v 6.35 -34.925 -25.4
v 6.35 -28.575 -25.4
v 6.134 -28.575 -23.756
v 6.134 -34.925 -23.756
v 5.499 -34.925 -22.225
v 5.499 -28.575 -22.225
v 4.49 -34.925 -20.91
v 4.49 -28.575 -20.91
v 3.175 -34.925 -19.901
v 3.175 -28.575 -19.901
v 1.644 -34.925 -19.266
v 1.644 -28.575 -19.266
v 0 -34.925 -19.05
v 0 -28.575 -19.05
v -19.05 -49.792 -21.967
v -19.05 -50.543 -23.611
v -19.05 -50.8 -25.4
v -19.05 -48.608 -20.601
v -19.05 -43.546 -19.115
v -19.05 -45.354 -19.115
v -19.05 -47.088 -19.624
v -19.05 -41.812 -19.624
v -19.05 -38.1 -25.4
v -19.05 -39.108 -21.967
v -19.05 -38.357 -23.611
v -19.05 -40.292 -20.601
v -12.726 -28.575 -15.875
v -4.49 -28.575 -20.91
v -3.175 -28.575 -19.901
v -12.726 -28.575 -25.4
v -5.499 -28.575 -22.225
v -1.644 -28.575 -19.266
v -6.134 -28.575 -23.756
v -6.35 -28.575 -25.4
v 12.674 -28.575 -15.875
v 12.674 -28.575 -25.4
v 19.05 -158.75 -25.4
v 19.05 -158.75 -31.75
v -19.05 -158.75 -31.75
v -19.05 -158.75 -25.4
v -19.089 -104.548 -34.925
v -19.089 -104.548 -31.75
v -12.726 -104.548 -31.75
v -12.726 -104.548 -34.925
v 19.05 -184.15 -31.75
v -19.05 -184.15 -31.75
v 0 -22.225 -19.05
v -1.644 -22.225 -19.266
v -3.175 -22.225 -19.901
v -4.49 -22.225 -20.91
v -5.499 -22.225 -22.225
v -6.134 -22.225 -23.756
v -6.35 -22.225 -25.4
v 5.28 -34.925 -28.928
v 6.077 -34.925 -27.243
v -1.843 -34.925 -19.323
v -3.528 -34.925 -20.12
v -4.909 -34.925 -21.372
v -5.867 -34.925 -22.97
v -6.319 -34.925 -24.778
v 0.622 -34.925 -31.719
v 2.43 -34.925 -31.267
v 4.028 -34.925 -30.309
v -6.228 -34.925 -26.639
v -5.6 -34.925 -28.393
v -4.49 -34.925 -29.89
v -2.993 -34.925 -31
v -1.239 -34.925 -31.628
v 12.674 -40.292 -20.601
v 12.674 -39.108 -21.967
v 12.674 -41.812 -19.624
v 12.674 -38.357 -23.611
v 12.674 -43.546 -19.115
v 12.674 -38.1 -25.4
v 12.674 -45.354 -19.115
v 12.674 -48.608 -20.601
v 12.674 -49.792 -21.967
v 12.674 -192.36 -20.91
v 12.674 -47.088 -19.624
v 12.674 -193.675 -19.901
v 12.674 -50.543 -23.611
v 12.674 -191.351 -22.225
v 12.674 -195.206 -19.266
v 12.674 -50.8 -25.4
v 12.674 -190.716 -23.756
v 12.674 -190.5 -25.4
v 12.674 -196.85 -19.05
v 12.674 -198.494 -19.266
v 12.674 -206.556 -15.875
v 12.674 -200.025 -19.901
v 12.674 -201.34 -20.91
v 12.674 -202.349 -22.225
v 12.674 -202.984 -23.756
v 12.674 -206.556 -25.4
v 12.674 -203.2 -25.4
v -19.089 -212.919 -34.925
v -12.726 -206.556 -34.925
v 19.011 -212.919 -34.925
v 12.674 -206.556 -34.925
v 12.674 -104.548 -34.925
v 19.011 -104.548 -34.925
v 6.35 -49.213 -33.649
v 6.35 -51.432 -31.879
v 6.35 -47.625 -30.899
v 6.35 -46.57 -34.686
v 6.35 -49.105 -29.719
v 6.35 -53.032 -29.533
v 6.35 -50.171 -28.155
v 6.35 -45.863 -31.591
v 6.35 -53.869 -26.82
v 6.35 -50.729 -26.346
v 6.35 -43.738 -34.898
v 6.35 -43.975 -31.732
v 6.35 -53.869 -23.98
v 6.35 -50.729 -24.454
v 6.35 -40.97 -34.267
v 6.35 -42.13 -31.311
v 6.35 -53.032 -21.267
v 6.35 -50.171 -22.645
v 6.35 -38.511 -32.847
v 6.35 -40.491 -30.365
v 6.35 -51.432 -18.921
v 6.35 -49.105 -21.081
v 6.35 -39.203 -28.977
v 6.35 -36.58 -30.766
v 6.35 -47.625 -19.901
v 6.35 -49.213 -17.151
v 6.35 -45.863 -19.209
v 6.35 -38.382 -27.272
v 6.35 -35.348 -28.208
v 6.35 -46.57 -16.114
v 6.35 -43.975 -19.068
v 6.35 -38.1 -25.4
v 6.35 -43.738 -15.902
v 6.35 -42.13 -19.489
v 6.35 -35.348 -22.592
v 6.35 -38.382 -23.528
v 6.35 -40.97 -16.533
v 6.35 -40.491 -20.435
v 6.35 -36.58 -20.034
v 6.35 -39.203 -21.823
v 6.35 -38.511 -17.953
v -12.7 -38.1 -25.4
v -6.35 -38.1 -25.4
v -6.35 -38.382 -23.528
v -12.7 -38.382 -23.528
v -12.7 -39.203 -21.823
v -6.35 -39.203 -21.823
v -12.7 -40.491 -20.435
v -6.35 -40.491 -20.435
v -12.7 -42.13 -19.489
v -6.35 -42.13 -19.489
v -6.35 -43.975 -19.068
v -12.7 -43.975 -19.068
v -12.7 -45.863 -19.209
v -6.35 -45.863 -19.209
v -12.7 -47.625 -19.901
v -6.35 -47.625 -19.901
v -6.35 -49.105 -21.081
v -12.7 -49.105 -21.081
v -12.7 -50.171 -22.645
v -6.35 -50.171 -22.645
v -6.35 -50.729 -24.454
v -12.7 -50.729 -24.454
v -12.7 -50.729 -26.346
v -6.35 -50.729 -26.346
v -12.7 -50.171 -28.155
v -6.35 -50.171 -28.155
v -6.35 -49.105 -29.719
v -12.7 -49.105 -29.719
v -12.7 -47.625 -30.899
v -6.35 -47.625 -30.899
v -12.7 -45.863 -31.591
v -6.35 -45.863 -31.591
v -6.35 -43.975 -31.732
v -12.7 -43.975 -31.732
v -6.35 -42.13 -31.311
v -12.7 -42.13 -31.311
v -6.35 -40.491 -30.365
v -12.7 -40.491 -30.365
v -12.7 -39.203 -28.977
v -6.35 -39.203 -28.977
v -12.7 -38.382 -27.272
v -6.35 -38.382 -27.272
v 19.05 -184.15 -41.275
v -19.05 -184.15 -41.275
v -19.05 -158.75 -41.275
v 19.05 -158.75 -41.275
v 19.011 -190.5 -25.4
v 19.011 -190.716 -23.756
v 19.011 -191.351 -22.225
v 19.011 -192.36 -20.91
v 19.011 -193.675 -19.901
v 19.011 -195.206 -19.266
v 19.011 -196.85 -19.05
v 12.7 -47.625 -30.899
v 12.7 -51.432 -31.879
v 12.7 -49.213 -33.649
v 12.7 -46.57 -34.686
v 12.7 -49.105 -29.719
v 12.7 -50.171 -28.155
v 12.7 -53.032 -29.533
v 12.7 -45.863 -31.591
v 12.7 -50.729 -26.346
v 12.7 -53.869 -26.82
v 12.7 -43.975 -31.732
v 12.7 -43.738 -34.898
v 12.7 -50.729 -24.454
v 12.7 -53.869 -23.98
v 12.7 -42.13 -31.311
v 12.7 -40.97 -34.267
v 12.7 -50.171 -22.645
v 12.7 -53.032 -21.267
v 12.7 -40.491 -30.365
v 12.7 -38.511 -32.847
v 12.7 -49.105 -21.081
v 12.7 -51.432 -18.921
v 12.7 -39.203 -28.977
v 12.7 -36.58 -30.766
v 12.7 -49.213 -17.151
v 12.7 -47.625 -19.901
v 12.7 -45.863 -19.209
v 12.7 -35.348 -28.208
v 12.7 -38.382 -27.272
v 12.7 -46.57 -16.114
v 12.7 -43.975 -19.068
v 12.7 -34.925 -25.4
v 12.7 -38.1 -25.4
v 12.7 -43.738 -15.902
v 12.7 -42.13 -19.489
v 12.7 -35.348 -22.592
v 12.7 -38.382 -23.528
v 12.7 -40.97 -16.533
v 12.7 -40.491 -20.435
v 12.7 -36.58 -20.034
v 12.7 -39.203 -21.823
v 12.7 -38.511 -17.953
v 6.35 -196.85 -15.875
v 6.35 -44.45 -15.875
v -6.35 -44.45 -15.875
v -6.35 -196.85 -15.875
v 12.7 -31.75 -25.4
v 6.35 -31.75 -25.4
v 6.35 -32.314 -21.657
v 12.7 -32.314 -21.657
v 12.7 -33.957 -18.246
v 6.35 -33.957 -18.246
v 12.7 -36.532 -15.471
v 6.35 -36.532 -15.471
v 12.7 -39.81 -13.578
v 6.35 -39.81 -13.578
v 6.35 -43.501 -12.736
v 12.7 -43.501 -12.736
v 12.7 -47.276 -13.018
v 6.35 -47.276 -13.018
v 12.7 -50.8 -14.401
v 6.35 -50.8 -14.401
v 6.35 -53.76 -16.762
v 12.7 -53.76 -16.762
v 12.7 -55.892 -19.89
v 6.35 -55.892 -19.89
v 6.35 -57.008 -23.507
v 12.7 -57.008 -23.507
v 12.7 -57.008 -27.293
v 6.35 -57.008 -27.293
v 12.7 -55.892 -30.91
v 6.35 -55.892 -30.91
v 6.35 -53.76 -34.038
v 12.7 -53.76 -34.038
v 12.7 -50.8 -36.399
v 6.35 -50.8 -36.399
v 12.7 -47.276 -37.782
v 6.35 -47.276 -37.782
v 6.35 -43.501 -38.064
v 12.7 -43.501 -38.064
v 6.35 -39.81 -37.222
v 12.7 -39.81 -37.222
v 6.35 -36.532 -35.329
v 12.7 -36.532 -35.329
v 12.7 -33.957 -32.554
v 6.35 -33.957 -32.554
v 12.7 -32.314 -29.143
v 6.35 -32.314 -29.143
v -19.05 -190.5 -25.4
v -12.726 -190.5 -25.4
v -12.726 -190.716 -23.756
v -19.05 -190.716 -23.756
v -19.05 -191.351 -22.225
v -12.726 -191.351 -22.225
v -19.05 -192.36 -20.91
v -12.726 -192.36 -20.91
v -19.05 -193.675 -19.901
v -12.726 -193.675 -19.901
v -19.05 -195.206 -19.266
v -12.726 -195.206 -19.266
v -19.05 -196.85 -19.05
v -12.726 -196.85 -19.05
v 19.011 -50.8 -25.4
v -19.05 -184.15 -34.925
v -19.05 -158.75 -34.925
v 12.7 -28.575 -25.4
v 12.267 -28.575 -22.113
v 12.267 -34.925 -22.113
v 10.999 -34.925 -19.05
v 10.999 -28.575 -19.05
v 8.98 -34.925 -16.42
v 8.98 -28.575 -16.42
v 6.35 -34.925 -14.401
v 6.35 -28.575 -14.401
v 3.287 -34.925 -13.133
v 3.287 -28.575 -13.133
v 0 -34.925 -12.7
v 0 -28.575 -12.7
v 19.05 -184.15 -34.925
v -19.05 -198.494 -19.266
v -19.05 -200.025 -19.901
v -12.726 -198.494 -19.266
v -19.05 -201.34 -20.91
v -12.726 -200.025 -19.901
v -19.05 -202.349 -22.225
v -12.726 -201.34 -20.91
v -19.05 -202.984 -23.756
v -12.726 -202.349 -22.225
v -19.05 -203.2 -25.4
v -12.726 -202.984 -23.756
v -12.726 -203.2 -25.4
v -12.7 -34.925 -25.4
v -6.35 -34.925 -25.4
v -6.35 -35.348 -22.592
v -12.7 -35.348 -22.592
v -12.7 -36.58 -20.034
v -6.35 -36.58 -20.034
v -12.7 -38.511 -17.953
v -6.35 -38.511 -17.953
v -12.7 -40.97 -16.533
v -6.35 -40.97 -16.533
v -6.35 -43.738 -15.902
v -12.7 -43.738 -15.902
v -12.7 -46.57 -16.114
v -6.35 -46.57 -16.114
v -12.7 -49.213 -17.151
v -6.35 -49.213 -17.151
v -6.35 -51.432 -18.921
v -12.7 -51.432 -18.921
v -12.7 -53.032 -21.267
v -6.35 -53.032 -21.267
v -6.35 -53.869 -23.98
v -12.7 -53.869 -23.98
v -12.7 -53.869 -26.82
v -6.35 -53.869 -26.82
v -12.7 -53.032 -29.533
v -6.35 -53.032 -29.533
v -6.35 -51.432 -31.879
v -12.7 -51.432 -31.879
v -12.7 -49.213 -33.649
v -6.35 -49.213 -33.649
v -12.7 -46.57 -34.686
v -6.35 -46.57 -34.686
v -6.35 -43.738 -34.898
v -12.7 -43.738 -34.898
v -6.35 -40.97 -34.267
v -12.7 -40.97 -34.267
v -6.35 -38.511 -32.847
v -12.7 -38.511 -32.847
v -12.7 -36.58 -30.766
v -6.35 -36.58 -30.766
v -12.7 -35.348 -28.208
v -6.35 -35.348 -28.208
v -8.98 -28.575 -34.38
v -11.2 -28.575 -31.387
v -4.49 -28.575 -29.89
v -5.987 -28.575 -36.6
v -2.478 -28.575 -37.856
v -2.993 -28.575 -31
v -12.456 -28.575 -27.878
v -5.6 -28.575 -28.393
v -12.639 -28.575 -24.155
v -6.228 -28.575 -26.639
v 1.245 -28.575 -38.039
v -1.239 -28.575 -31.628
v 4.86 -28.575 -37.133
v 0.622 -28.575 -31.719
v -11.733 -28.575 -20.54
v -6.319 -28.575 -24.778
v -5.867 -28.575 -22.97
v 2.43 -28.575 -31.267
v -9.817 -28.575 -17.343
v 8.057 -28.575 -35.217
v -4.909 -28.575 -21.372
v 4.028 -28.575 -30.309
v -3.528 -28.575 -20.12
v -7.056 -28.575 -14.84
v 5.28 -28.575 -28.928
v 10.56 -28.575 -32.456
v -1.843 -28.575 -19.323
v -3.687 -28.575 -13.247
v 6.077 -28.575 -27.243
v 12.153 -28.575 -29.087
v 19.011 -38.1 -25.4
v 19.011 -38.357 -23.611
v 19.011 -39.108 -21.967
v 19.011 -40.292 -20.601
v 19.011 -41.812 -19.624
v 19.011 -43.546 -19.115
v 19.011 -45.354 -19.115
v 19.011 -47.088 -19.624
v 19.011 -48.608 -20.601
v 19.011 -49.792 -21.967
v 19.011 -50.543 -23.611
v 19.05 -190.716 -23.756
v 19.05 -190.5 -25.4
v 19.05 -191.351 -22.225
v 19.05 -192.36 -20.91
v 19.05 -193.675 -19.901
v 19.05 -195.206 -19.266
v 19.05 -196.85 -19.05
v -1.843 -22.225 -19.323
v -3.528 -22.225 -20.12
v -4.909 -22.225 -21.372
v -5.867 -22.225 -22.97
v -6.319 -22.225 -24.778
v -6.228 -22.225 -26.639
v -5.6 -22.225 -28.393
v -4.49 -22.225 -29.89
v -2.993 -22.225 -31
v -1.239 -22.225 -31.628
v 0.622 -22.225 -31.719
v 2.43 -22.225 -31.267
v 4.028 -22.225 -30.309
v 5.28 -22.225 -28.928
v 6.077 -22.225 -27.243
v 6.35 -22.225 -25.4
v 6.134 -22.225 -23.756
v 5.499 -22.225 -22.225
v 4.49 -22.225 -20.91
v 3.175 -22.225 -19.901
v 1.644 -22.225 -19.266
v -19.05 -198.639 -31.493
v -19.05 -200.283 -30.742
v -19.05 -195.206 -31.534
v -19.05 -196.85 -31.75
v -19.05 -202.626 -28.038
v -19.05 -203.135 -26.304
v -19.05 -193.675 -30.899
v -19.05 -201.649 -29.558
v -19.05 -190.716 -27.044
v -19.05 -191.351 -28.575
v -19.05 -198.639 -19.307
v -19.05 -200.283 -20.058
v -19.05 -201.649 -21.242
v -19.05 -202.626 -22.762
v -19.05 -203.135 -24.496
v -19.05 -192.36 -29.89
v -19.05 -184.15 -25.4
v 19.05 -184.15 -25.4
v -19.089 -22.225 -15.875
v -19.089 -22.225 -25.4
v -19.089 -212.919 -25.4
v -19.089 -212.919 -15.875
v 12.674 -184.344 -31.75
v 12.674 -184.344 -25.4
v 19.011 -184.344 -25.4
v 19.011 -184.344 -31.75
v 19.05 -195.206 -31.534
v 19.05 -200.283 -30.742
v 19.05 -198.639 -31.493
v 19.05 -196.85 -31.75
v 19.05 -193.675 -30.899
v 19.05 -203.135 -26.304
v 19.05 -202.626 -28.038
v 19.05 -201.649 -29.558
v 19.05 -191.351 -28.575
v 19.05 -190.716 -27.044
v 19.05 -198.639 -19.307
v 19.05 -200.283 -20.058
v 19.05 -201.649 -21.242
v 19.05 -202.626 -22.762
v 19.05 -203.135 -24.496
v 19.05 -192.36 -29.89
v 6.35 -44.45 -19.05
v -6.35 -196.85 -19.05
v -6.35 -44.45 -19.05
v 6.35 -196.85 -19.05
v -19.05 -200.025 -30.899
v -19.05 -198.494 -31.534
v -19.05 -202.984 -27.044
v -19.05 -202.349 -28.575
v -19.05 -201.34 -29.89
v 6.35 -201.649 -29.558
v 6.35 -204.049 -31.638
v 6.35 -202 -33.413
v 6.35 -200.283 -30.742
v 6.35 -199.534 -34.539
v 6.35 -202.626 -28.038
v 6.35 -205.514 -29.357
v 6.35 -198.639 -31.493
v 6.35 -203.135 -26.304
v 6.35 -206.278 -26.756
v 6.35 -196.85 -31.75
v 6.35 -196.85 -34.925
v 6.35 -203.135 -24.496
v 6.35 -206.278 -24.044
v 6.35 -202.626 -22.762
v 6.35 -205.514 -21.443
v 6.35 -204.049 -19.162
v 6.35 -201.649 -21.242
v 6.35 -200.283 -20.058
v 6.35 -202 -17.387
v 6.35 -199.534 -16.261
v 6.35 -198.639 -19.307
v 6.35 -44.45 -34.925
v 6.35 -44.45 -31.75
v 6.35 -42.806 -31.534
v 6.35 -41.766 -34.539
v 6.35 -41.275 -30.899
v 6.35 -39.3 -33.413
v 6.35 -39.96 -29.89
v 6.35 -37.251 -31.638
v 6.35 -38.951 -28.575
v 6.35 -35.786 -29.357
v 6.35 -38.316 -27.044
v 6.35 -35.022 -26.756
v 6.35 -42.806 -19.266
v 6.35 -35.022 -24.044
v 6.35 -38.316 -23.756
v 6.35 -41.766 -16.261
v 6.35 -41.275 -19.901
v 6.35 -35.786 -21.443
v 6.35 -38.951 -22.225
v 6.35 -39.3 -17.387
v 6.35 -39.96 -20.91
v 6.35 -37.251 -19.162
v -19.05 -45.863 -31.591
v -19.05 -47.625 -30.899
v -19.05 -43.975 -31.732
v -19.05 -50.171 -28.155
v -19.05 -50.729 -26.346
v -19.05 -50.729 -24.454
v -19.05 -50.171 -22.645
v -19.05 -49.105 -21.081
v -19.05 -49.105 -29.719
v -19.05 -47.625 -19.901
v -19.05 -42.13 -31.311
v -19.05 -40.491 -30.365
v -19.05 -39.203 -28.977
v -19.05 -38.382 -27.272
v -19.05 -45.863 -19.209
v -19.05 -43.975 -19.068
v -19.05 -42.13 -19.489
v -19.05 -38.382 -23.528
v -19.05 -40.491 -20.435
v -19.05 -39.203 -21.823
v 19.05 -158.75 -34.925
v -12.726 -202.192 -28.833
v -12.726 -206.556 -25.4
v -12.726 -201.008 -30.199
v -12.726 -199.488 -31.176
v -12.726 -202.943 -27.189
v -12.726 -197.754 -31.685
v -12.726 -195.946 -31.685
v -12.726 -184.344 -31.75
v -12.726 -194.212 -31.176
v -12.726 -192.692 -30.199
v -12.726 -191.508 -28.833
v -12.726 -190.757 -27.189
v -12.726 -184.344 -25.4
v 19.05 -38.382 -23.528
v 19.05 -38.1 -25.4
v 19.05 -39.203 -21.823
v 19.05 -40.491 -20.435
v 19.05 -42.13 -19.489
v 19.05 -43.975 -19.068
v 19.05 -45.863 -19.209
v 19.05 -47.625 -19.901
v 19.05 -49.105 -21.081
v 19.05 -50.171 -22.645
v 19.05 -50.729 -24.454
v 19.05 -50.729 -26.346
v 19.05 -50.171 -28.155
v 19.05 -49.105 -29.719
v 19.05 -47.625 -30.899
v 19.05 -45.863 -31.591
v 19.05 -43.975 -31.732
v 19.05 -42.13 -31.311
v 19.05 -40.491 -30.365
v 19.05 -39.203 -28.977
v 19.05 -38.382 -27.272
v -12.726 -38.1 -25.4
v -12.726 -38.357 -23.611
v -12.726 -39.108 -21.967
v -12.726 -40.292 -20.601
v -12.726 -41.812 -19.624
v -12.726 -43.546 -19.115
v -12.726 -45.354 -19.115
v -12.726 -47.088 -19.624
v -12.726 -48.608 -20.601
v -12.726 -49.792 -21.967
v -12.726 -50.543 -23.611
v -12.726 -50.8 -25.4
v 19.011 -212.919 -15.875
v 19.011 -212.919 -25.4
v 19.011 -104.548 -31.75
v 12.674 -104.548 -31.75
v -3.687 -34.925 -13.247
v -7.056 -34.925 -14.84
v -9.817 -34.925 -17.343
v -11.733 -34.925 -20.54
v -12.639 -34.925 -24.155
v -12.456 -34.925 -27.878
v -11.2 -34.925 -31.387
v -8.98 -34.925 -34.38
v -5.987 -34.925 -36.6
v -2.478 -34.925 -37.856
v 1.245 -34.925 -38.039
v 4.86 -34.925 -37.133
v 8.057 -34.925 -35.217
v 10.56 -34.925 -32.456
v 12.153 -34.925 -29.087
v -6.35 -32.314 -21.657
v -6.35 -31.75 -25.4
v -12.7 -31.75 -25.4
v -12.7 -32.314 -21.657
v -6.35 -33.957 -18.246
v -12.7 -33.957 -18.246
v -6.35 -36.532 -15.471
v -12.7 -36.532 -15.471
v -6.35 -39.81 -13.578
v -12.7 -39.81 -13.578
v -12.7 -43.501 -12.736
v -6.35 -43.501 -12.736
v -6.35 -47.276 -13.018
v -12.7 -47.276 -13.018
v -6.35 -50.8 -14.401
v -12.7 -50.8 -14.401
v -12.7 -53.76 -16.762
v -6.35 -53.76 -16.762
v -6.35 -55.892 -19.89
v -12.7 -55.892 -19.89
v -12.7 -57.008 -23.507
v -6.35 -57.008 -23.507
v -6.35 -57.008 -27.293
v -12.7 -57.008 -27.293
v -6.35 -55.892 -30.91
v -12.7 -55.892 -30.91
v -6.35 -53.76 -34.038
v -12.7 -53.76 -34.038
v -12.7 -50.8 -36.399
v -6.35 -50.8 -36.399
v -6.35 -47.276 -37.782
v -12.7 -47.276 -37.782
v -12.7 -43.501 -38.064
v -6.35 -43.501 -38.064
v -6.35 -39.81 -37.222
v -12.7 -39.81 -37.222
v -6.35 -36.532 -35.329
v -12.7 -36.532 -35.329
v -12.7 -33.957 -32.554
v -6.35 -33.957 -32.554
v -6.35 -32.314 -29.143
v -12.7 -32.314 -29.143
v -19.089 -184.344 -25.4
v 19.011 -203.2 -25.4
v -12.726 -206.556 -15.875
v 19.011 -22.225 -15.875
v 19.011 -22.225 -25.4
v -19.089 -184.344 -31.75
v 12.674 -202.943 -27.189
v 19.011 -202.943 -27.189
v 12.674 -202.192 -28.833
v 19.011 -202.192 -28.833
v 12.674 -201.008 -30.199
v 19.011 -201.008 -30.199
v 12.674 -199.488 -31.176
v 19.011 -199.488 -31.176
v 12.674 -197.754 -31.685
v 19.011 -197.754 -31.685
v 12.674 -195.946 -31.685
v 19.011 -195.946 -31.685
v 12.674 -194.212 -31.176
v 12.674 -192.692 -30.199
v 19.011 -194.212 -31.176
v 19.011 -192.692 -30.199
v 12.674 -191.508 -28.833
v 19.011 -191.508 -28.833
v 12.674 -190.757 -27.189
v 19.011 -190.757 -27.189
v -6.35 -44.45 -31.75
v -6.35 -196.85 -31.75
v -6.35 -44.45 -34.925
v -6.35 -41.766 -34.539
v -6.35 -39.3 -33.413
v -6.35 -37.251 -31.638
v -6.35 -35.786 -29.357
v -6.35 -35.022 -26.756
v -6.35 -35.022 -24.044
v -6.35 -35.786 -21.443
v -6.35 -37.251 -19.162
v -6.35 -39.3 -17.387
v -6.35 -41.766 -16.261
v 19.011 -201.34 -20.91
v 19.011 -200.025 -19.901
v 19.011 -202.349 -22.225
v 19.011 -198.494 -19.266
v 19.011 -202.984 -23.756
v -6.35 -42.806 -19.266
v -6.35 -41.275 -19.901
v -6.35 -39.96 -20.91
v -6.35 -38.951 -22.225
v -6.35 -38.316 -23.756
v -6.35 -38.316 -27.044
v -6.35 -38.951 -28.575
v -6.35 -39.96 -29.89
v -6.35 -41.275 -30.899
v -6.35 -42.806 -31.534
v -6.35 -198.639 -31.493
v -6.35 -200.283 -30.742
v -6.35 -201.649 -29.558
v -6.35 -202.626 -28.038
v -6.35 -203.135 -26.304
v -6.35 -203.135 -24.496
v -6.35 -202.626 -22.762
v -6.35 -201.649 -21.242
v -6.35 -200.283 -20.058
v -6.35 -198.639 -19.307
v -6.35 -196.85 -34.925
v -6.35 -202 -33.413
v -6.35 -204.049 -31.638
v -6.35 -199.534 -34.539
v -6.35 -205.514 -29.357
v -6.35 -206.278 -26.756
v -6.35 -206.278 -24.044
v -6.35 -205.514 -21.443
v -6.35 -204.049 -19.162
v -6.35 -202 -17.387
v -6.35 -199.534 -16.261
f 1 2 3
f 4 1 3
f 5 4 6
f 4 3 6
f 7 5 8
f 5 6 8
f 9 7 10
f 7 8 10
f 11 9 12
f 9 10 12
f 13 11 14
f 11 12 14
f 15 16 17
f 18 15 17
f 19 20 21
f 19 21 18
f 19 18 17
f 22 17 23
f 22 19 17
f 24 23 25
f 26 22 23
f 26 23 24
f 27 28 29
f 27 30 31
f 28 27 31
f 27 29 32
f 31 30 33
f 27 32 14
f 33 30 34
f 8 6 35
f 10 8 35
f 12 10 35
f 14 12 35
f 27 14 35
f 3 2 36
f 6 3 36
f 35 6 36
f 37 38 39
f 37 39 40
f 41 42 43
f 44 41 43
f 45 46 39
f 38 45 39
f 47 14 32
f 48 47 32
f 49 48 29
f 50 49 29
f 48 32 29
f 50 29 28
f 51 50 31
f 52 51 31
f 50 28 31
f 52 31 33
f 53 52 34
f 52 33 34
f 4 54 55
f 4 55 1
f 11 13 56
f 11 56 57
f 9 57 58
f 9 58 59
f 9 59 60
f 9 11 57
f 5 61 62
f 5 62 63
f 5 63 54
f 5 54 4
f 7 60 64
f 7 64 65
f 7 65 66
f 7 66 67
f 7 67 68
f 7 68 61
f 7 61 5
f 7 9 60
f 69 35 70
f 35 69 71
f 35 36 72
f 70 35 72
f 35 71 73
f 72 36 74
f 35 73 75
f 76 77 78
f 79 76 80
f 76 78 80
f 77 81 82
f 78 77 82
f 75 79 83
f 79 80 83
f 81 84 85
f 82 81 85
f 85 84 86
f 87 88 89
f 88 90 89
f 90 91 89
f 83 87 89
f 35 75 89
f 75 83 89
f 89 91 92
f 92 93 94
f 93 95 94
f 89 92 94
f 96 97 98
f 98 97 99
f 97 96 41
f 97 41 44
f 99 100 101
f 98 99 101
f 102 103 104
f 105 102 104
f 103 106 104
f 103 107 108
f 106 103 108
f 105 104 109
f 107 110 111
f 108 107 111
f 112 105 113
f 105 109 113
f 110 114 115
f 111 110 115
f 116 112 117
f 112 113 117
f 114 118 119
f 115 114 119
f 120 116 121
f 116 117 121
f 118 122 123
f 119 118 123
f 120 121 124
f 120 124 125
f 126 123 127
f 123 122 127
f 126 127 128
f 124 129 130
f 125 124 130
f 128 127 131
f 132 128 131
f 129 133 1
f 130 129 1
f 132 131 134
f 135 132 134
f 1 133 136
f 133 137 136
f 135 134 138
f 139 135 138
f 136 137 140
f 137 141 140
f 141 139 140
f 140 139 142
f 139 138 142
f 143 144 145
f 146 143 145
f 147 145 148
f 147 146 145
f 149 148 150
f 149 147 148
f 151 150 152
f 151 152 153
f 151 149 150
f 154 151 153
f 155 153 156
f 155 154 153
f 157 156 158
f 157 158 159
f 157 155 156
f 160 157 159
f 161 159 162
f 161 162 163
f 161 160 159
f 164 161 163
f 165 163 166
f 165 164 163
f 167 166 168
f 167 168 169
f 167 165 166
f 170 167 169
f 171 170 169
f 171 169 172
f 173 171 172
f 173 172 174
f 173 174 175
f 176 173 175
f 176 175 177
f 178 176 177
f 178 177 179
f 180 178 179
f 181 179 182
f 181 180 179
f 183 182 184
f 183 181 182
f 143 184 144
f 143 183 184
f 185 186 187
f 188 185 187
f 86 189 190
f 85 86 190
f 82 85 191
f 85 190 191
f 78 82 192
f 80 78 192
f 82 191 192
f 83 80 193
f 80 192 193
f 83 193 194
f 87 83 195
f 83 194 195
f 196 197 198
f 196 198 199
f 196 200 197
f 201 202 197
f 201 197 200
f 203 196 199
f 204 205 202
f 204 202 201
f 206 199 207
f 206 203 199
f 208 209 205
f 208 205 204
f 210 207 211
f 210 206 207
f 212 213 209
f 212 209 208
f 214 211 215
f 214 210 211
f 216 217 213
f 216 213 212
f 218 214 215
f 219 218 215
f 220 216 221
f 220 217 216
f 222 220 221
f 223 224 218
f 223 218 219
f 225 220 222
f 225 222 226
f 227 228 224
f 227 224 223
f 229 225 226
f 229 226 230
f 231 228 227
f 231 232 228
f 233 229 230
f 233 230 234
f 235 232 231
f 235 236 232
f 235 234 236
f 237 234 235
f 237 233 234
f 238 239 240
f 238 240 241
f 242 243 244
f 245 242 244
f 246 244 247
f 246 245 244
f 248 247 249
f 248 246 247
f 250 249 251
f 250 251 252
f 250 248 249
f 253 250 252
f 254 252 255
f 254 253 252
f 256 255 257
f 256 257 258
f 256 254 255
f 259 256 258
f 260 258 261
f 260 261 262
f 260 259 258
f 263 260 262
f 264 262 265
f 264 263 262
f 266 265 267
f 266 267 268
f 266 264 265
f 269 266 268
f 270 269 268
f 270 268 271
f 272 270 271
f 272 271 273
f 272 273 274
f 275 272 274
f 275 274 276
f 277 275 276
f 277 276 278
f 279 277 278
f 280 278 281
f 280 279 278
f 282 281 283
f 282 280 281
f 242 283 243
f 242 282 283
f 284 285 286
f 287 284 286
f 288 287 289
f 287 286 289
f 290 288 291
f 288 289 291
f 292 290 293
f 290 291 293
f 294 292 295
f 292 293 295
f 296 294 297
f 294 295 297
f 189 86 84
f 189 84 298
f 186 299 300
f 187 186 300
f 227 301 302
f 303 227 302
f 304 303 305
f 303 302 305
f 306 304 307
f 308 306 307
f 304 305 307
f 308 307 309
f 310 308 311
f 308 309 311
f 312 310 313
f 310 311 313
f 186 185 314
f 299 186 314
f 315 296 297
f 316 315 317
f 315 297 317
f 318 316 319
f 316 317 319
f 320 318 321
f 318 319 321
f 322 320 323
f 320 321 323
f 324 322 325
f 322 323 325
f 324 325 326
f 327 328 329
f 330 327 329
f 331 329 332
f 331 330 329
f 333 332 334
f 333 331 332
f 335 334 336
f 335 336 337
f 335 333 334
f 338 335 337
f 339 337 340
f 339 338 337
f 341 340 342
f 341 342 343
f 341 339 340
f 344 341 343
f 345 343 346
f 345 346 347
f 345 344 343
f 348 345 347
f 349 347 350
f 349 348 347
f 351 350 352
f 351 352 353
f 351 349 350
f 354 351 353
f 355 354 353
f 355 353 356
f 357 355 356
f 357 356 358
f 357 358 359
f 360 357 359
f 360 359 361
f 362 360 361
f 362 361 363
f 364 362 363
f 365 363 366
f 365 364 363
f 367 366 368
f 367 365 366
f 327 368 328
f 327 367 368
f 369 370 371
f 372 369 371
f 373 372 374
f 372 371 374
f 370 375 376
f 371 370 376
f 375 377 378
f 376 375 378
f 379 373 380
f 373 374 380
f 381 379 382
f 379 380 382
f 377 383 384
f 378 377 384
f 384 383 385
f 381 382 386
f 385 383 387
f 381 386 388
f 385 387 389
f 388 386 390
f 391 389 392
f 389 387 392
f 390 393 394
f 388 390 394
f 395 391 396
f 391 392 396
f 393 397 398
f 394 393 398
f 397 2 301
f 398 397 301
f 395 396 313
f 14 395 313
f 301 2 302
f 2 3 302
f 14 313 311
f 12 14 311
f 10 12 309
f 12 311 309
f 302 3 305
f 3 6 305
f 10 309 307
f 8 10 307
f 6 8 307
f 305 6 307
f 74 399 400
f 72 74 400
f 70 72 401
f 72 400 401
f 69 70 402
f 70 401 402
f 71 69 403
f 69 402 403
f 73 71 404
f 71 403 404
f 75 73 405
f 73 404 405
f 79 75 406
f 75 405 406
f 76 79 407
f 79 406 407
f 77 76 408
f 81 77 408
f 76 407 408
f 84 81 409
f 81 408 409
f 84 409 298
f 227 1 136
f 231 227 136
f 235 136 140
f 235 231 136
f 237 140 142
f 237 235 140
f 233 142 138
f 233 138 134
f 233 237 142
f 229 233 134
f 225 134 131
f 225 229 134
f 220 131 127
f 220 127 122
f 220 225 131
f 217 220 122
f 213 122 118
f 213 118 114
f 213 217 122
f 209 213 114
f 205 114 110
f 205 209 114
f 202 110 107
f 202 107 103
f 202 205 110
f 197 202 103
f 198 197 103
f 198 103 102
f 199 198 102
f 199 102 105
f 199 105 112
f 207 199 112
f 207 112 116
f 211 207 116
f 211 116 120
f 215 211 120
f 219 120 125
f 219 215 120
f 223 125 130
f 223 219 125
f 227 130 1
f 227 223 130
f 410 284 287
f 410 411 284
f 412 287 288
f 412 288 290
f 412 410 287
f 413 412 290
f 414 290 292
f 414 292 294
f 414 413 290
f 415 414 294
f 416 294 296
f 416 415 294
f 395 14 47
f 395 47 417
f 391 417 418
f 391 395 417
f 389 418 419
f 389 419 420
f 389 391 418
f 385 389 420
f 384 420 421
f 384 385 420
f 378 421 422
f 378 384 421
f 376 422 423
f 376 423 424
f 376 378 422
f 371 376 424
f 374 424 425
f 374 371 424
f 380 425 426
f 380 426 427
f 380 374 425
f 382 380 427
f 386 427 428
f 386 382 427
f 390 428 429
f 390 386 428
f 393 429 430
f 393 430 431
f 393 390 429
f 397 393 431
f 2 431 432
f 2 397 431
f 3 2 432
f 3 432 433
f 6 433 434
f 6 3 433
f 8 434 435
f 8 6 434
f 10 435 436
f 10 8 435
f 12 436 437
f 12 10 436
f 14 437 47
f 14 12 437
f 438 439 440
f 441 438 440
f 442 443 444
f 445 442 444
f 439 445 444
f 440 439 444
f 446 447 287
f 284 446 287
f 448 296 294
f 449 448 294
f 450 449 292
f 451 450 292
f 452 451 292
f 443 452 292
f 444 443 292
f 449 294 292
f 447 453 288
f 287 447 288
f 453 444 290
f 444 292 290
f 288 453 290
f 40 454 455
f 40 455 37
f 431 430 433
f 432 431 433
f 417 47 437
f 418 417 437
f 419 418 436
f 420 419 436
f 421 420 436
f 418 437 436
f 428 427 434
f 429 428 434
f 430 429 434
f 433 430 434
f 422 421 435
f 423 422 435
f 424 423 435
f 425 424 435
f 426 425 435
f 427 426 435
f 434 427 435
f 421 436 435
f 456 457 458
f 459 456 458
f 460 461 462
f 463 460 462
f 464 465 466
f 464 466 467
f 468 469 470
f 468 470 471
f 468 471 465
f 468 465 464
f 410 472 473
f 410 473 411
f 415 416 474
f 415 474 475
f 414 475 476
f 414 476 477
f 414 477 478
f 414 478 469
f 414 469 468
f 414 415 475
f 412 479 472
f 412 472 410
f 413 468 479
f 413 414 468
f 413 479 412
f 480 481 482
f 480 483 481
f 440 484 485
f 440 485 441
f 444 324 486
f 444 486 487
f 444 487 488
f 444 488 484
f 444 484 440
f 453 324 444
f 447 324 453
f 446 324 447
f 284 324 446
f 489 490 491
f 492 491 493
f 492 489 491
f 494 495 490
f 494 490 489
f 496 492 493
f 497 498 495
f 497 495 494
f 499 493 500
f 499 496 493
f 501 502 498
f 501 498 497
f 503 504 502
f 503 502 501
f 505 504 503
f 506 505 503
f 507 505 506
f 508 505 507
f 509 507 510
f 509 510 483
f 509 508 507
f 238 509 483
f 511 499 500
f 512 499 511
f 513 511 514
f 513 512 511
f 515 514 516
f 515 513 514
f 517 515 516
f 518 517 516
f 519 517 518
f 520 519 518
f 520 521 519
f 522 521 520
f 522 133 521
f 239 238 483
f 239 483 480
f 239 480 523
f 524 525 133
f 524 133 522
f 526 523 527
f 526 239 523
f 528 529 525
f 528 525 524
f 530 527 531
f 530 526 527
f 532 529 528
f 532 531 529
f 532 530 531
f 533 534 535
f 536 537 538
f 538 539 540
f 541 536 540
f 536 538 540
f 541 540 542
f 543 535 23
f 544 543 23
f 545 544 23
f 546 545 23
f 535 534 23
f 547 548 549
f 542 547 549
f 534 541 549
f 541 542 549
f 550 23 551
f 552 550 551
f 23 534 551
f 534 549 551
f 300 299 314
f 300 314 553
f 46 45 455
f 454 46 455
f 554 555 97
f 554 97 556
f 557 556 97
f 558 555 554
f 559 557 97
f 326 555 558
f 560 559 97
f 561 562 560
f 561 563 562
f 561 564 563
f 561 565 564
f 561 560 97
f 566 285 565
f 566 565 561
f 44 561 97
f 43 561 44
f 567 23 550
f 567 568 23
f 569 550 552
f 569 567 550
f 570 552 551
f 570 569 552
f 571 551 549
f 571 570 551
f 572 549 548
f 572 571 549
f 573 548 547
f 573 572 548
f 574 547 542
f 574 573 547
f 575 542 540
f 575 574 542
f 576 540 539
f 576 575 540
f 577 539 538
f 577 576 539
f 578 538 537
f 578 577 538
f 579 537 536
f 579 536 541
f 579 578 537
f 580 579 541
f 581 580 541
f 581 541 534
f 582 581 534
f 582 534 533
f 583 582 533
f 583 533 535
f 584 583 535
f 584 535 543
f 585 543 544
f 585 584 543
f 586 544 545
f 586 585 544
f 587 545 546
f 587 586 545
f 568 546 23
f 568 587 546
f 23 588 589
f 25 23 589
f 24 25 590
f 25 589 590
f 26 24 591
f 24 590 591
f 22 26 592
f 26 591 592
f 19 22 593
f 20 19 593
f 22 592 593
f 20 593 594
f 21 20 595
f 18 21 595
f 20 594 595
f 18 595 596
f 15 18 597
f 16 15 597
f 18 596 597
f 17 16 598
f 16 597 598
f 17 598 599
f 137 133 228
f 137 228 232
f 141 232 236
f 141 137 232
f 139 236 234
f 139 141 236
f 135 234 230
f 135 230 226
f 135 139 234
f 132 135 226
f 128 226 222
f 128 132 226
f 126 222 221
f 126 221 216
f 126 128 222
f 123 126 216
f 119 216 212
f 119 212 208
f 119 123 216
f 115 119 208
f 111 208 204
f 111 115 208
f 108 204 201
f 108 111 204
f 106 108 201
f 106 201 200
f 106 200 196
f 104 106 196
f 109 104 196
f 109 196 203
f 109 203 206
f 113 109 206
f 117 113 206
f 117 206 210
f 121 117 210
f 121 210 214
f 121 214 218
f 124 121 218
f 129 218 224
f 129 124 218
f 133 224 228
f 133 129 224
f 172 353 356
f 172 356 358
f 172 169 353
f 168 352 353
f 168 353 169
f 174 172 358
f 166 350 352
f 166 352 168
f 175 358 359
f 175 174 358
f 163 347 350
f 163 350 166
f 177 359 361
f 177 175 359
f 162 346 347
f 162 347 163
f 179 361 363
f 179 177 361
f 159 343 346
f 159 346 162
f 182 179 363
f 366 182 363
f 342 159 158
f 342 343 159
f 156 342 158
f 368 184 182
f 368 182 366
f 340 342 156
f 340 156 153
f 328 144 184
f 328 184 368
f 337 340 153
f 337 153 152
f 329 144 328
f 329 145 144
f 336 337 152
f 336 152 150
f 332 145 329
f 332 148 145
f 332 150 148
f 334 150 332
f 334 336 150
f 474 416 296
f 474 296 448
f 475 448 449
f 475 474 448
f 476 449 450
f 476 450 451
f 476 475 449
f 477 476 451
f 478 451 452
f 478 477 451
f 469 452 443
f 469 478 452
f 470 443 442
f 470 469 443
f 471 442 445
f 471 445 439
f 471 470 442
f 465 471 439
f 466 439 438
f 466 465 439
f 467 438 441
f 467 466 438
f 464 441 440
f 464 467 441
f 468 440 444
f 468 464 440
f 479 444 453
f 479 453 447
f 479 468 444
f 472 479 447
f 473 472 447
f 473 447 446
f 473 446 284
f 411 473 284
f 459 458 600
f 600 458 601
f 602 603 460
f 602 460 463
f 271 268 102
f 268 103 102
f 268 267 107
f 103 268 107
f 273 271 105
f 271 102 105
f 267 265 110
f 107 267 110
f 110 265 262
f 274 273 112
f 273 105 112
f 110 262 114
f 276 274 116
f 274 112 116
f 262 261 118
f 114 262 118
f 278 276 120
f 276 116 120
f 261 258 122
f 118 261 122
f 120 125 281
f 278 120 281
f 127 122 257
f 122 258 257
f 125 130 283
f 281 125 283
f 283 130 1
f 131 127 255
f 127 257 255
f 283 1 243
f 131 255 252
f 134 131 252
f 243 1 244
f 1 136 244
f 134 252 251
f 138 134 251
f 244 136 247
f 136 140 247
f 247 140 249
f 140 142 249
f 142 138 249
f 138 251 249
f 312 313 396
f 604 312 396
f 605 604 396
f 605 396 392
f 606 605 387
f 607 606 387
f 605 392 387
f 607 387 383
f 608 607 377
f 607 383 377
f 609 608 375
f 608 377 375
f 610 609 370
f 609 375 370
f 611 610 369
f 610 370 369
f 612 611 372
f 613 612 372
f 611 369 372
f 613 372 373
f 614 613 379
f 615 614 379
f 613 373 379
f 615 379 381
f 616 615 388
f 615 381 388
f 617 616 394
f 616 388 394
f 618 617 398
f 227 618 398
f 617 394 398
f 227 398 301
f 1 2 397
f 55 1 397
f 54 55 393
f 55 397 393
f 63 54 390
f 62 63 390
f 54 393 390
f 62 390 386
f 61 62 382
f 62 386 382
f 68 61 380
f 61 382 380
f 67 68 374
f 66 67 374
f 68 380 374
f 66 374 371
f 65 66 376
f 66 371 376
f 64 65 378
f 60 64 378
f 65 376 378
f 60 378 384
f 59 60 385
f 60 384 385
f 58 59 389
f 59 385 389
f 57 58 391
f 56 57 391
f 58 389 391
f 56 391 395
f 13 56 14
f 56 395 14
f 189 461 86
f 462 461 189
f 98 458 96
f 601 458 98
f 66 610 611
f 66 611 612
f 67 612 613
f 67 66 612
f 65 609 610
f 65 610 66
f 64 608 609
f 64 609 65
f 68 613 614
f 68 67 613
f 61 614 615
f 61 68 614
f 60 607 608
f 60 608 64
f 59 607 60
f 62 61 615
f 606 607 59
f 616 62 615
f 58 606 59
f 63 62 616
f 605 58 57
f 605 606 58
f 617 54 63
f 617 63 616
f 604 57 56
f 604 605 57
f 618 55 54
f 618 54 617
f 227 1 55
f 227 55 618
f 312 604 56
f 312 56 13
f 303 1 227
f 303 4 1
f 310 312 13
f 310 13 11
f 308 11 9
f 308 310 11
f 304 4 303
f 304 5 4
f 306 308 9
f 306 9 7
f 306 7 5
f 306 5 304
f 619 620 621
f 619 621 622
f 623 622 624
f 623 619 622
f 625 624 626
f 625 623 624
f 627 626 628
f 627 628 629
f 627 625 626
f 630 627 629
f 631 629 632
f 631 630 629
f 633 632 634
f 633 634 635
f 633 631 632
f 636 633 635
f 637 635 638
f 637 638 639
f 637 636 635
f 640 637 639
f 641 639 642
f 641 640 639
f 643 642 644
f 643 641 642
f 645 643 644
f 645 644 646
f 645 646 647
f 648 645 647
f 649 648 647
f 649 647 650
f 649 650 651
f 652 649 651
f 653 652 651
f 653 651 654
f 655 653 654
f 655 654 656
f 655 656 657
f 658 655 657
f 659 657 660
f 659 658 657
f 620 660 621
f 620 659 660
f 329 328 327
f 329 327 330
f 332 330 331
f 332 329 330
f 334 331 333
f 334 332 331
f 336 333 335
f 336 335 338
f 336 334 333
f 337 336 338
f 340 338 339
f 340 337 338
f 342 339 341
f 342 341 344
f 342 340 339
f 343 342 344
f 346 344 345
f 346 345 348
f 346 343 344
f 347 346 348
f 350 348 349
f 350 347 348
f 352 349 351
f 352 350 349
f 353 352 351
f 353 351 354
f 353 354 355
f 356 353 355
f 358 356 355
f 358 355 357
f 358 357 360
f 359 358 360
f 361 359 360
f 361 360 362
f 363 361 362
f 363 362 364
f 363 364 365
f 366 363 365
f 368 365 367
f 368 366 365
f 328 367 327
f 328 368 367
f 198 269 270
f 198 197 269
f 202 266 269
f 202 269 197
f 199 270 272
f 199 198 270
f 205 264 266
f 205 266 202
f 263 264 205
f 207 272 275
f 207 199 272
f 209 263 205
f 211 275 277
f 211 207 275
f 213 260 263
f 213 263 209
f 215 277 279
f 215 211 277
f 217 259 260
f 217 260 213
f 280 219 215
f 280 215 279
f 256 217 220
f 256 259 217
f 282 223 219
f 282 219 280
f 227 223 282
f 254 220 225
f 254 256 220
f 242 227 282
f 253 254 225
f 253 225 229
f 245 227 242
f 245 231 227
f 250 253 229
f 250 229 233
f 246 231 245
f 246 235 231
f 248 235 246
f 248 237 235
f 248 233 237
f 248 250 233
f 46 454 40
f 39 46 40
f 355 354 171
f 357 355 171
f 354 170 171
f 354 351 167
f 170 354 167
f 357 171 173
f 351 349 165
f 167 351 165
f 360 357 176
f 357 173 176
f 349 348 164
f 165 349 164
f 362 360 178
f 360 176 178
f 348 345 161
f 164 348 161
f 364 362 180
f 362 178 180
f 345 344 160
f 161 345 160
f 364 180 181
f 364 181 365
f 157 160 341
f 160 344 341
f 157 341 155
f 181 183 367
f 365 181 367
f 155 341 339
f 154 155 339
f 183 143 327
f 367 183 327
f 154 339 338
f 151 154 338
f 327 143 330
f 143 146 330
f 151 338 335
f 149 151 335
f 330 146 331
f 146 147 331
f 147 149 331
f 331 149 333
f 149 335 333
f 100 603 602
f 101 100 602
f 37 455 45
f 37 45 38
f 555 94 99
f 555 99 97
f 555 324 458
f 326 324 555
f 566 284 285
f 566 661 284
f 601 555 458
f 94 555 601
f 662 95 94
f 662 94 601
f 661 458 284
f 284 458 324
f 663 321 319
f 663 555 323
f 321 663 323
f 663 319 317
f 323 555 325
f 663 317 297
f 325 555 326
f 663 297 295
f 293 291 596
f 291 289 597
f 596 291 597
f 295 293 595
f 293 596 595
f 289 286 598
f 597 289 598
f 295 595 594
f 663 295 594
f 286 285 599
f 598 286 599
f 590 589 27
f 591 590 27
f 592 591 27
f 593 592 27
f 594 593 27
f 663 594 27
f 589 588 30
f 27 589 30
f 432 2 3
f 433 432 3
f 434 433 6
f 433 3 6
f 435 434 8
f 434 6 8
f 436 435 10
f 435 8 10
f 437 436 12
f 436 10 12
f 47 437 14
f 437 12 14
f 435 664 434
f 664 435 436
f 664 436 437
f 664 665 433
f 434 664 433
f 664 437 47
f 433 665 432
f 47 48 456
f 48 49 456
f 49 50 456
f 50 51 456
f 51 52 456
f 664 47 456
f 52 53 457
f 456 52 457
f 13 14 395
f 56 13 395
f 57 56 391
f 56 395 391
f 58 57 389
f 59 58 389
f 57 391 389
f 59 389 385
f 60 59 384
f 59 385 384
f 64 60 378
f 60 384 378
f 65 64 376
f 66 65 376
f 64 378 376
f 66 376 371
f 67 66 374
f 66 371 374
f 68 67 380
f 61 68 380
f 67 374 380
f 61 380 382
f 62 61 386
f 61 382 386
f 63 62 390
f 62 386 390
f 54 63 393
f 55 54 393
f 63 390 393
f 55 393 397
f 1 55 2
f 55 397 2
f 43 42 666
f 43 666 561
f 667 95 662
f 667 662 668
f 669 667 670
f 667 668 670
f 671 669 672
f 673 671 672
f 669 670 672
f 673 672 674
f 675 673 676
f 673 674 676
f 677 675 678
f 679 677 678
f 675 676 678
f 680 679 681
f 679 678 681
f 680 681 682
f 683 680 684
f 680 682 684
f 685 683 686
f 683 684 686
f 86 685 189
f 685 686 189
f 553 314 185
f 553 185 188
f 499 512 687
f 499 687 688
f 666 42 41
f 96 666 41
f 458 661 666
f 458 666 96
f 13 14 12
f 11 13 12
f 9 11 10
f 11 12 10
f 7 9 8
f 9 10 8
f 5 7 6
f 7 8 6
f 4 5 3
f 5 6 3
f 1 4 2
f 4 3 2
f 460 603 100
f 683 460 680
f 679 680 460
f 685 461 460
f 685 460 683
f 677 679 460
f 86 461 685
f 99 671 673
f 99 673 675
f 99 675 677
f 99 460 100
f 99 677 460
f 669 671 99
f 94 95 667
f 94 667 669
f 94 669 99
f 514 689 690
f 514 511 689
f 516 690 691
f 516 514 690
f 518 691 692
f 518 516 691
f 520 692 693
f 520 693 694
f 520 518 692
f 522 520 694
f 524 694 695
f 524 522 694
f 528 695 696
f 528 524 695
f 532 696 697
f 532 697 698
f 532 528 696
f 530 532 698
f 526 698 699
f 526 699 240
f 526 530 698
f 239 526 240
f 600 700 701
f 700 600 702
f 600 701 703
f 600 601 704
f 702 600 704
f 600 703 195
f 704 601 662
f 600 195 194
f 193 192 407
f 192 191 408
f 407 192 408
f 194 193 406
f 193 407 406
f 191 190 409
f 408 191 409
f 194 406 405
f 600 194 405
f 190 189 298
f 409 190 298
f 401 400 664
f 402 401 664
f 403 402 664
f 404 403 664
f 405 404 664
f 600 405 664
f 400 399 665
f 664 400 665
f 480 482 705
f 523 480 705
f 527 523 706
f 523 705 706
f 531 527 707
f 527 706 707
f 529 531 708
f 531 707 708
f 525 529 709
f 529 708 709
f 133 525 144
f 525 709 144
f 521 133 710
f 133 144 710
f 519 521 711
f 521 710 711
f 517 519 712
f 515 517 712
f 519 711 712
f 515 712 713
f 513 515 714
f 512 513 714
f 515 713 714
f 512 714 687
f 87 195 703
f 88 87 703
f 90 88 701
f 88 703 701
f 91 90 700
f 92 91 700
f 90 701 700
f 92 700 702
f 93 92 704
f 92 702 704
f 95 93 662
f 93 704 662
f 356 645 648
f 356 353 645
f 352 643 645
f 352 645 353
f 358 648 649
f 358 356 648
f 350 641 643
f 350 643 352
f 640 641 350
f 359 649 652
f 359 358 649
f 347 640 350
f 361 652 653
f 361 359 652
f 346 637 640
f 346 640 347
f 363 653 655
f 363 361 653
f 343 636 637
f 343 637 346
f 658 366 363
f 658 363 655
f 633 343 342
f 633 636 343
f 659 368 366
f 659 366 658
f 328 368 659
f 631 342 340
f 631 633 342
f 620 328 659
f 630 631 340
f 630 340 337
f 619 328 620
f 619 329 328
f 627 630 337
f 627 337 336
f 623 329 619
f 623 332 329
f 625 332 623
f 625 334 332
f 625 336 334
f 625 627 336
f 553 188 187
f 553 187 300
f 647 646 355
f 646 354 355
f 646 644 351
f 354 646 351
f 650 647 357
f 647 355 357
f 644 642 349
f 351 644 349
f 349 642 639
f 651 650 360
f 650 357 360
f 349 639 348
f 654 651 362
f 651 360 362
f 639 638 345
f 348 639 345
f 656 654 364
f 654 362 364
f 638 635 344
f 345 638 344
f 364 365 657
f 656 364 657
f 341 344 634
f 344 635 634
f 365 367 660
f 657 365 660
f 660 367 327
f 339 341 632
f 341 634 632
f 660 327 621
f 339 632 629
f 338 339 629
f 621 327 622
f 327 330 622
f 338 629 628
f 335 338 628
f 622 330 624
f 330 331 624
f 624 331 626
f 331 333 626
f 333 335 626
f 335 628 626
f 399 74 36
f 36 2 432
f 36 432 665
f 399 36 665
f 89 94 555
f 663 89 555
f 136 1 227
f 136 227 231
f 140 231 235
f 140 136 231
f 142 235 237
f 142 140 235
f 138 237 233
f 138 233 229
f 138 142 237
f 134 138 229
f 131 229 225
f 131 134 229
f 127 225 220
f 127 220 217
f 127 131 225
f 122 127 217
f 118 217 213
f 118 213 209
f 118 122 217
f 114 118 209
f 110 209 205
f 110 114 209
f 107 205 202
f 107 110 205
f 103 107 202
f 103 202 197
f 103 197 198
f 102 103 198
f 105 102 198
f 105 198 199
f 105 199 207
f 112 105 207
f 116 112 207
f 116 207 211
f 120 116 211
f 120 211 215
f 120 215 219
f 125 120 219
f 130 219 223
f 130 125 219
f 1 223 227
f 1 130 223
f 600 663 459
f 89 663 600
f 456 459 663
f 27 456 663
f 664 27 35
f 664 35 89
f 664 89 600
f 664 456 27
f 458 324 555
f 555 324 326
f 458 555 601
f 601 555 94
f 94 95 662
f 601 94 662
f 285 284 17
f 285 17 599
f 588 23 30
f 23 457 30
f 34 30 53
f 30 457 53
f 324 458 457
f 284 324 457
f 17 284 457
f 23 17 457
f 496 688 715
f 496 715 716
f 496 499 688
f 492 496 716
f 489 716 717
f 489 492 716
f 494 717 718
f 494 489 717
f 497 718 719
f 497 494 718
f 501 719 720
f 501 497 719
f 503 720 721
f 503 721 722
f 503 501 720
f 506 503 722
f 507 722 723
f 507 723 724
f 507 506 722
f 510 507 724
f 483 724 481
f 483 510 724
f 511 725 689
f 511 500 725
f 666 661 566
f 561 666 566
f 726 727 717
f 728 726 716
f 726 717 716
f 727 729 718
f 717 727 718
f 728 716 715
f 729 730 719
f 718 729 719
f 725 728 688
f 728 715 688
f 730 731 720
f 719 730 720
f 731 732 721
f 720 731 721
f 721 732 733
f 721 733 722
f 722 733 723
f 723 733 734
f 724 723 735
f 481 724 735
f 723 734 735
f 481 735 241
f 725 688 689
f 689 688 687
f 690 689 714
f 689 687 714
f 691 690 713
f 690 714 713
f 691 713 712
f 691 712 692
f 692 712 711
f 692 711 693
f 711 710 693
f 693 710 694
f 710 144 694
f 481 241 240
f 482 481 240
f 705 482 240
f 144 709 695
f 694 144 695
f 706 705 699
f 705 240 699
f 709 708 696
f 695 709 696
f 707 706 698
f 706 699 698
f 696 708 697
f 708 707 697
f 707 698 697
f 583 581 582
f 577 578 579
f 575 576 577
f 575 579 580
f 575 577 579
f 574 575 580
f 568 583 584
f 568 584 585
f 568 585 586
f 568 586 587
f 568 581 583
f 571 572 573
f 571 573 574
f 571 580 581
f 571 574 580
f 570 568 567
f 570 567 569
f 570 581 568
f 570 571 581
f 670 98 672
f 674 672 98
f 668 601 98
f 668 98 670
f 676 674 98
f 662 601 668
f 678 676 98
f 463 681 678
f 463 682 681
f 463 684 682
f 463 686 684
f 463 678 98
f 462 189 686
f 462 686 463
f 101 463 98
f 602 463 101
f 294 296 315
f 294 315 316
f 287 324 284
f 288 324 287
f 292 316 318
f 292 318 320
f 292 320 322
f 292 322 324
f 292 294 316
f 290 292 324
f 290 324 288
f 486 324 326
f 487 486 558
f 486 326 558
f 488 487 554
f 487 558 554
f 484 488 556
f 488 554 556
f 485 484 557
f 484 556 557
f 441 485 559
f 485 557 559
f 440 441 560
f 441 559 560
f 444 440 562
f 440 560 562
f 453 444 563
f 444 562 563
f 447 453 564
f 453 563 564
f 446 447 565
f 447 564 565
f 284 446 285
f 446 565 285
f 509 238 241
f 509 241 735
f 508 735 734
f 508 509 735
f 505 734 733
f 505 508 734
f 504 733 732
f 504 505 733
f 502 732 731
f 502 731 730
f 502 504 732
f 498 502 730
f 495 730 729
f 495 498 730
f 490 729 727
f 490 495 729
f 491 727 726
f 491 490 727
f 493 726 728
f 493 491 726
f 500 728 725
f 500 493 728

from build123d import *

# Parameters (mm, degrees)
F2_DEPTH  = 6.35
F3_R      = 12.7
F3_R_2    = 9.525
F4_DEPTH  = 12.7
F5_DEPTH  = 6.35
F3_R_3    = 6.35
F6_DEPTH  = 19.05
F7_DEPTH  = 12.7
F8_DEPTH  = 6.35
F10_DEPTH = 6.35
F11_DEPTH = 19.05
F9_W      = 25.4
F9_H      = 6.35
F12_DEPTH = 19.05
F13_DEPTH = 6.35
F15_W     = 6.3629296671
F15_H     = 79.796386
F15_W_2   = 6.3370703329
F16_DEPTH = 9.525
F17_DEPTH = 6.35
F18_DEPTH = 9.525


# Not quite as in the source:
# - a feature names something its author has since deleted; it is built from what else it names


with BuildPart() as f2:
    # F1 (on offset) → F2 (new body)
    with BuildSketch(Plane.XZ.offset(28.575)):
        with BuildLine():
            ThreePointArc((12.7, -25.4), (8.9802561211, -16.4197438789), (0, -12.7))
            ThreePointArc((0, -12.7), (-8.9802561211, -34.3802561211), (12.7, -25.4))
        make_face()
        with BuildLine():
            ThreePointArc((6.35, -25.4), (-4.4901280605, -29.8901280605), (0, -19.05))
            ThreePointArc((0, -19.05), (4.4901280605, -20.9098719395), (6.35, -25.4))
        make_face(mode=Mode.SUBTRACT)
    extrude(amount=F2_DEPTH)


with BuildPart() as f4:
    # F3 (on Right) → F4 (new body, symmetric)
    with BuildSketch(Plane.YZ):
        with Locations((-44.45, -25.4)):
            Circle(F3_R)
        with Locations((-44.45, -25.4)):
            Circle(F3_R_2, mode=Mode.SUBTRACT)
    extrude(amount=F4_DEPTH, both=True)

    # F3 (on Right) → F5 (cut, symmetric)
    with BuildSketch(Plane.YZ):
        with Locations((-44.45, -25.4)):
            Circle(F3_R)
        with Locations((-44.45, -25.4)):
            Circle(F3_R_2, mode=Mode.SUBTRACT)
    extrude(amount=F5_DEPTH, both=True, mode=Mode.SUBTRACT)


with BuildPart() as f6:
    # F3 (on Right) → F6 (new body, symmetric)
    with BuildSketch(Plane.YZ):
        with Locations((-44.45, -25.4)):
            Circle(F3_R_3)
    extrude(amount=F6_DEPTH, both=True)


with BuildPart() as f7:
    # F3 (on Right) → F7 (new body, symmetric)
    with BuildSketch(Plane.YZ):
        with Locations((-44.45, -25.4)):
            Circle(F3_R_2)
        with Locations((-44.45, -25.4)):
            Circle(F3_R_3, mode=Mode.SUBTRACT)
    extrude(amount=F7_DEPTH, both=True)

    # F3 (on Right) → F8 (cut, symmetric)
    with BuildSketch(Plane.YZ):
        with Locations((-44.45, -25.4)):
            Circle(F3_R_2)
        with Locations((-44.45, -25.4)):
            Circle(F3_R_3, mode=Mode.SUBTRACT)
    extrude(amount=F8_DEPTH, both=True, mode=Mode.SUBTRACT)


with BuildPart() as f10:
    # F9 (on Right) → F10 (new body, symmetric)
    with BuildSketch(Plane.YZ):
        with BuildLine():
            Line((-158.75, -34.925), (-44.45, -34.925))
            ThreePointArc((-44.45, -34.925), (-34.925, -25.4), (-44.45, -15.875))
            Line((-44.45, -15.875), (-196.85, -15.875))
            ThreePointArc((-196.85, -15.875), (-206.375, -25.4), (-196.85, -34.925))
            Line((-196.85, -34.925), (-184.15, -34.925))
            Line((-184.15, -34.925), (-158.75, -34.925))
        make_face()
        with BuildLine():
            ThreePointArc((-44.45, -19.05), (-39.9598719395, -20.9098719395), (-38.1, -25.4))
            ThreePointArc((-38.1, -25.4), (-39.9598719395, -29.8901280605), (-44.45, -31.75))
            Line((-44.45, -31.75), (-158.75, -31.75))
            Line((-158.75, -31.75), (-184.15, -31.75))
            Line((-184.15, -31.75), (-196.85, -31.75))
            ThreePointArc((-196.85, -31.75), (-203.2, -25.4), (-196.85, -19.05))
            Line((-196.85, -19.05), (-44.45, -19.05))
        make_face(mode=Mode.SUBTRACT)
    extrude(amount=F10_DEPTH, both=True)


with BuildPart() as f11:
    # F9 (on Right) → F11 (new body, symmetric)
    with BuildSketch(Plane.YZ):
        with BuildLine():
            ThreePointArc((-190.5, -25.4), (-192.3598719395, -20.9098719395), (-196.85, -19.05))
            ThreePointArc((-196.85, -19.05), (-203.2, -25.4), (-196.85, -31.75))
            ThreePointArc((-196.85, -31.75), (-192.3598719395, -29.8901280605), (-190.5, -25.4))
        make_face()
    extrude(amount=F11_DEPTH, both=True)


with BuildPart() as f12:
    # F9 (on Right) → F12 (new body, symmetric)
    with BuildSketch(Plane.YZ):
        with Locations((-171.45, -28.575)):
            Rectangle(F9_W, F9_H)
    extrude(amount=F12_DEPTH, both=True)


with BuildPart() as f12b:
    # F9 (on Right) → F12, piece 2 (new body, symmetric)
    with BuildSketch(Plane.YZ):
        with Locations((-171.45, -38.1)):
            Rectangle(F9_W, F9_H)
    extrude(amount=F12_DEPTH, both=True)


with BuildPart() as f13:
    # F1 (on offset) → F13 (new body, symmetric)
    with BuildSketch(Plane.XZ.offset(28.575)):
        with BuildLine():
            ThreePointArc((6.35, -25.4), (4.4901280605, -20.9098719395), (0, -19.05))
            ThreePointArc((0, -19.05), (-4.4901280605, -29.8901280605), (6.35, -25.4))
        make_face()
    extrude(amount=F13_DEPTH, both=True)


with BuildPart() as f16:
    # F15 (on offset) → F16 (new body)
    with BuildSketch(Plane.XY.offset(-25.4)):
        Polygon((-19.0887890014, -184.3439450068), (-19.0887890014, -212.9189450068), (19.0112109986, -212.9189450068), (19.0112109986, -184.3439450068), (12.6741406658, -184.3439450068), (12.6741406658, -206.5560153396), (-12.7258593342, -206.5560153396), (-12.7258593342, -184.3439450068), align=None)
        with Locations((-15.9073241678, -144.4457520068)):
            Rectangle(F15_W, F15_H)
        with Locations((15.8426758322, -144.4457520068)):
            Rectangle(F15_W_2, F15_H)
    extrude(amount=-F16_DEPTH)

    # F15 (on offset) → F17 (cut)
    with BuildSketch(Plane.XY.offset(-25.4)):
        with Locations((-15.9073241678, -144.4457520068)):
            Rectangle(F15_W, F15_H)
        with Locations((15.8426758322, -144.4457520068)):
            Rectangle(F15_W_2, F15_H)
    extrude(amount=-F17_DEPTH, mode=Mode.SUBTRACT)

    # F19: cut F11, F6, F13
    add(f11.part, mode=Mode.SUBTRACT)
    add(f6.part, mode=Mode.SUBTRACT)
    add(f13.part, mode=Mode.SUBTRACT)


with BuildPart() as f18:
    # F15 (on offset) → F18 (new body)
    with BuildSketch(Plane.XY.offset(-25.4)):
        Polygon((-19.0887890014, -184.3439450068), (-19.0887890014, -212.9189450068), (19.0112109986, -212.9189450068), (19.0112109986, -184.3439450068), (12.6741406658, -184.3439450068), (12.6741406658, -206.5560153396), (-12.7258593342, -206.5560153396), (-12.7258593342, -184.3439450068), align=None)
        Polygon((-19.0887890014, -22.225), (-19.0887890014, -104.5475590068), (-12.7258593342, -104.5475590068), (-12.7258593342, -28.575), (-12.7, -28.575), (12.6741406658, -28.575), (12.6741406658, -104.5475590068), (19.0112109986, -104.5475590068), (19.0112109986, -22.225), align=None)
        with Locations((-15.9073241678, -144.4457520068)):
            Rectangle(F15_W, F15_H)
        with Locations((15.8426758322, -144.4457520068)):
            Rectangle(F15_W_2, F15_H)
    extrude(amount=F18_DEPTH)

    # F19: cut F11, F6, F13
    add(f11.part, mode=Mode.SUBTRACT)
    add(f6.part, mode=Mode.SUBTRACT)
    add(f13.part, mode=Mode.SUBTRACT)


solid = Compound([f2.part, f4.part, f6.part, f7.part, f10.part, f11.part, f12.part, f12b.part, f13.part, f16.part, f18.part])
